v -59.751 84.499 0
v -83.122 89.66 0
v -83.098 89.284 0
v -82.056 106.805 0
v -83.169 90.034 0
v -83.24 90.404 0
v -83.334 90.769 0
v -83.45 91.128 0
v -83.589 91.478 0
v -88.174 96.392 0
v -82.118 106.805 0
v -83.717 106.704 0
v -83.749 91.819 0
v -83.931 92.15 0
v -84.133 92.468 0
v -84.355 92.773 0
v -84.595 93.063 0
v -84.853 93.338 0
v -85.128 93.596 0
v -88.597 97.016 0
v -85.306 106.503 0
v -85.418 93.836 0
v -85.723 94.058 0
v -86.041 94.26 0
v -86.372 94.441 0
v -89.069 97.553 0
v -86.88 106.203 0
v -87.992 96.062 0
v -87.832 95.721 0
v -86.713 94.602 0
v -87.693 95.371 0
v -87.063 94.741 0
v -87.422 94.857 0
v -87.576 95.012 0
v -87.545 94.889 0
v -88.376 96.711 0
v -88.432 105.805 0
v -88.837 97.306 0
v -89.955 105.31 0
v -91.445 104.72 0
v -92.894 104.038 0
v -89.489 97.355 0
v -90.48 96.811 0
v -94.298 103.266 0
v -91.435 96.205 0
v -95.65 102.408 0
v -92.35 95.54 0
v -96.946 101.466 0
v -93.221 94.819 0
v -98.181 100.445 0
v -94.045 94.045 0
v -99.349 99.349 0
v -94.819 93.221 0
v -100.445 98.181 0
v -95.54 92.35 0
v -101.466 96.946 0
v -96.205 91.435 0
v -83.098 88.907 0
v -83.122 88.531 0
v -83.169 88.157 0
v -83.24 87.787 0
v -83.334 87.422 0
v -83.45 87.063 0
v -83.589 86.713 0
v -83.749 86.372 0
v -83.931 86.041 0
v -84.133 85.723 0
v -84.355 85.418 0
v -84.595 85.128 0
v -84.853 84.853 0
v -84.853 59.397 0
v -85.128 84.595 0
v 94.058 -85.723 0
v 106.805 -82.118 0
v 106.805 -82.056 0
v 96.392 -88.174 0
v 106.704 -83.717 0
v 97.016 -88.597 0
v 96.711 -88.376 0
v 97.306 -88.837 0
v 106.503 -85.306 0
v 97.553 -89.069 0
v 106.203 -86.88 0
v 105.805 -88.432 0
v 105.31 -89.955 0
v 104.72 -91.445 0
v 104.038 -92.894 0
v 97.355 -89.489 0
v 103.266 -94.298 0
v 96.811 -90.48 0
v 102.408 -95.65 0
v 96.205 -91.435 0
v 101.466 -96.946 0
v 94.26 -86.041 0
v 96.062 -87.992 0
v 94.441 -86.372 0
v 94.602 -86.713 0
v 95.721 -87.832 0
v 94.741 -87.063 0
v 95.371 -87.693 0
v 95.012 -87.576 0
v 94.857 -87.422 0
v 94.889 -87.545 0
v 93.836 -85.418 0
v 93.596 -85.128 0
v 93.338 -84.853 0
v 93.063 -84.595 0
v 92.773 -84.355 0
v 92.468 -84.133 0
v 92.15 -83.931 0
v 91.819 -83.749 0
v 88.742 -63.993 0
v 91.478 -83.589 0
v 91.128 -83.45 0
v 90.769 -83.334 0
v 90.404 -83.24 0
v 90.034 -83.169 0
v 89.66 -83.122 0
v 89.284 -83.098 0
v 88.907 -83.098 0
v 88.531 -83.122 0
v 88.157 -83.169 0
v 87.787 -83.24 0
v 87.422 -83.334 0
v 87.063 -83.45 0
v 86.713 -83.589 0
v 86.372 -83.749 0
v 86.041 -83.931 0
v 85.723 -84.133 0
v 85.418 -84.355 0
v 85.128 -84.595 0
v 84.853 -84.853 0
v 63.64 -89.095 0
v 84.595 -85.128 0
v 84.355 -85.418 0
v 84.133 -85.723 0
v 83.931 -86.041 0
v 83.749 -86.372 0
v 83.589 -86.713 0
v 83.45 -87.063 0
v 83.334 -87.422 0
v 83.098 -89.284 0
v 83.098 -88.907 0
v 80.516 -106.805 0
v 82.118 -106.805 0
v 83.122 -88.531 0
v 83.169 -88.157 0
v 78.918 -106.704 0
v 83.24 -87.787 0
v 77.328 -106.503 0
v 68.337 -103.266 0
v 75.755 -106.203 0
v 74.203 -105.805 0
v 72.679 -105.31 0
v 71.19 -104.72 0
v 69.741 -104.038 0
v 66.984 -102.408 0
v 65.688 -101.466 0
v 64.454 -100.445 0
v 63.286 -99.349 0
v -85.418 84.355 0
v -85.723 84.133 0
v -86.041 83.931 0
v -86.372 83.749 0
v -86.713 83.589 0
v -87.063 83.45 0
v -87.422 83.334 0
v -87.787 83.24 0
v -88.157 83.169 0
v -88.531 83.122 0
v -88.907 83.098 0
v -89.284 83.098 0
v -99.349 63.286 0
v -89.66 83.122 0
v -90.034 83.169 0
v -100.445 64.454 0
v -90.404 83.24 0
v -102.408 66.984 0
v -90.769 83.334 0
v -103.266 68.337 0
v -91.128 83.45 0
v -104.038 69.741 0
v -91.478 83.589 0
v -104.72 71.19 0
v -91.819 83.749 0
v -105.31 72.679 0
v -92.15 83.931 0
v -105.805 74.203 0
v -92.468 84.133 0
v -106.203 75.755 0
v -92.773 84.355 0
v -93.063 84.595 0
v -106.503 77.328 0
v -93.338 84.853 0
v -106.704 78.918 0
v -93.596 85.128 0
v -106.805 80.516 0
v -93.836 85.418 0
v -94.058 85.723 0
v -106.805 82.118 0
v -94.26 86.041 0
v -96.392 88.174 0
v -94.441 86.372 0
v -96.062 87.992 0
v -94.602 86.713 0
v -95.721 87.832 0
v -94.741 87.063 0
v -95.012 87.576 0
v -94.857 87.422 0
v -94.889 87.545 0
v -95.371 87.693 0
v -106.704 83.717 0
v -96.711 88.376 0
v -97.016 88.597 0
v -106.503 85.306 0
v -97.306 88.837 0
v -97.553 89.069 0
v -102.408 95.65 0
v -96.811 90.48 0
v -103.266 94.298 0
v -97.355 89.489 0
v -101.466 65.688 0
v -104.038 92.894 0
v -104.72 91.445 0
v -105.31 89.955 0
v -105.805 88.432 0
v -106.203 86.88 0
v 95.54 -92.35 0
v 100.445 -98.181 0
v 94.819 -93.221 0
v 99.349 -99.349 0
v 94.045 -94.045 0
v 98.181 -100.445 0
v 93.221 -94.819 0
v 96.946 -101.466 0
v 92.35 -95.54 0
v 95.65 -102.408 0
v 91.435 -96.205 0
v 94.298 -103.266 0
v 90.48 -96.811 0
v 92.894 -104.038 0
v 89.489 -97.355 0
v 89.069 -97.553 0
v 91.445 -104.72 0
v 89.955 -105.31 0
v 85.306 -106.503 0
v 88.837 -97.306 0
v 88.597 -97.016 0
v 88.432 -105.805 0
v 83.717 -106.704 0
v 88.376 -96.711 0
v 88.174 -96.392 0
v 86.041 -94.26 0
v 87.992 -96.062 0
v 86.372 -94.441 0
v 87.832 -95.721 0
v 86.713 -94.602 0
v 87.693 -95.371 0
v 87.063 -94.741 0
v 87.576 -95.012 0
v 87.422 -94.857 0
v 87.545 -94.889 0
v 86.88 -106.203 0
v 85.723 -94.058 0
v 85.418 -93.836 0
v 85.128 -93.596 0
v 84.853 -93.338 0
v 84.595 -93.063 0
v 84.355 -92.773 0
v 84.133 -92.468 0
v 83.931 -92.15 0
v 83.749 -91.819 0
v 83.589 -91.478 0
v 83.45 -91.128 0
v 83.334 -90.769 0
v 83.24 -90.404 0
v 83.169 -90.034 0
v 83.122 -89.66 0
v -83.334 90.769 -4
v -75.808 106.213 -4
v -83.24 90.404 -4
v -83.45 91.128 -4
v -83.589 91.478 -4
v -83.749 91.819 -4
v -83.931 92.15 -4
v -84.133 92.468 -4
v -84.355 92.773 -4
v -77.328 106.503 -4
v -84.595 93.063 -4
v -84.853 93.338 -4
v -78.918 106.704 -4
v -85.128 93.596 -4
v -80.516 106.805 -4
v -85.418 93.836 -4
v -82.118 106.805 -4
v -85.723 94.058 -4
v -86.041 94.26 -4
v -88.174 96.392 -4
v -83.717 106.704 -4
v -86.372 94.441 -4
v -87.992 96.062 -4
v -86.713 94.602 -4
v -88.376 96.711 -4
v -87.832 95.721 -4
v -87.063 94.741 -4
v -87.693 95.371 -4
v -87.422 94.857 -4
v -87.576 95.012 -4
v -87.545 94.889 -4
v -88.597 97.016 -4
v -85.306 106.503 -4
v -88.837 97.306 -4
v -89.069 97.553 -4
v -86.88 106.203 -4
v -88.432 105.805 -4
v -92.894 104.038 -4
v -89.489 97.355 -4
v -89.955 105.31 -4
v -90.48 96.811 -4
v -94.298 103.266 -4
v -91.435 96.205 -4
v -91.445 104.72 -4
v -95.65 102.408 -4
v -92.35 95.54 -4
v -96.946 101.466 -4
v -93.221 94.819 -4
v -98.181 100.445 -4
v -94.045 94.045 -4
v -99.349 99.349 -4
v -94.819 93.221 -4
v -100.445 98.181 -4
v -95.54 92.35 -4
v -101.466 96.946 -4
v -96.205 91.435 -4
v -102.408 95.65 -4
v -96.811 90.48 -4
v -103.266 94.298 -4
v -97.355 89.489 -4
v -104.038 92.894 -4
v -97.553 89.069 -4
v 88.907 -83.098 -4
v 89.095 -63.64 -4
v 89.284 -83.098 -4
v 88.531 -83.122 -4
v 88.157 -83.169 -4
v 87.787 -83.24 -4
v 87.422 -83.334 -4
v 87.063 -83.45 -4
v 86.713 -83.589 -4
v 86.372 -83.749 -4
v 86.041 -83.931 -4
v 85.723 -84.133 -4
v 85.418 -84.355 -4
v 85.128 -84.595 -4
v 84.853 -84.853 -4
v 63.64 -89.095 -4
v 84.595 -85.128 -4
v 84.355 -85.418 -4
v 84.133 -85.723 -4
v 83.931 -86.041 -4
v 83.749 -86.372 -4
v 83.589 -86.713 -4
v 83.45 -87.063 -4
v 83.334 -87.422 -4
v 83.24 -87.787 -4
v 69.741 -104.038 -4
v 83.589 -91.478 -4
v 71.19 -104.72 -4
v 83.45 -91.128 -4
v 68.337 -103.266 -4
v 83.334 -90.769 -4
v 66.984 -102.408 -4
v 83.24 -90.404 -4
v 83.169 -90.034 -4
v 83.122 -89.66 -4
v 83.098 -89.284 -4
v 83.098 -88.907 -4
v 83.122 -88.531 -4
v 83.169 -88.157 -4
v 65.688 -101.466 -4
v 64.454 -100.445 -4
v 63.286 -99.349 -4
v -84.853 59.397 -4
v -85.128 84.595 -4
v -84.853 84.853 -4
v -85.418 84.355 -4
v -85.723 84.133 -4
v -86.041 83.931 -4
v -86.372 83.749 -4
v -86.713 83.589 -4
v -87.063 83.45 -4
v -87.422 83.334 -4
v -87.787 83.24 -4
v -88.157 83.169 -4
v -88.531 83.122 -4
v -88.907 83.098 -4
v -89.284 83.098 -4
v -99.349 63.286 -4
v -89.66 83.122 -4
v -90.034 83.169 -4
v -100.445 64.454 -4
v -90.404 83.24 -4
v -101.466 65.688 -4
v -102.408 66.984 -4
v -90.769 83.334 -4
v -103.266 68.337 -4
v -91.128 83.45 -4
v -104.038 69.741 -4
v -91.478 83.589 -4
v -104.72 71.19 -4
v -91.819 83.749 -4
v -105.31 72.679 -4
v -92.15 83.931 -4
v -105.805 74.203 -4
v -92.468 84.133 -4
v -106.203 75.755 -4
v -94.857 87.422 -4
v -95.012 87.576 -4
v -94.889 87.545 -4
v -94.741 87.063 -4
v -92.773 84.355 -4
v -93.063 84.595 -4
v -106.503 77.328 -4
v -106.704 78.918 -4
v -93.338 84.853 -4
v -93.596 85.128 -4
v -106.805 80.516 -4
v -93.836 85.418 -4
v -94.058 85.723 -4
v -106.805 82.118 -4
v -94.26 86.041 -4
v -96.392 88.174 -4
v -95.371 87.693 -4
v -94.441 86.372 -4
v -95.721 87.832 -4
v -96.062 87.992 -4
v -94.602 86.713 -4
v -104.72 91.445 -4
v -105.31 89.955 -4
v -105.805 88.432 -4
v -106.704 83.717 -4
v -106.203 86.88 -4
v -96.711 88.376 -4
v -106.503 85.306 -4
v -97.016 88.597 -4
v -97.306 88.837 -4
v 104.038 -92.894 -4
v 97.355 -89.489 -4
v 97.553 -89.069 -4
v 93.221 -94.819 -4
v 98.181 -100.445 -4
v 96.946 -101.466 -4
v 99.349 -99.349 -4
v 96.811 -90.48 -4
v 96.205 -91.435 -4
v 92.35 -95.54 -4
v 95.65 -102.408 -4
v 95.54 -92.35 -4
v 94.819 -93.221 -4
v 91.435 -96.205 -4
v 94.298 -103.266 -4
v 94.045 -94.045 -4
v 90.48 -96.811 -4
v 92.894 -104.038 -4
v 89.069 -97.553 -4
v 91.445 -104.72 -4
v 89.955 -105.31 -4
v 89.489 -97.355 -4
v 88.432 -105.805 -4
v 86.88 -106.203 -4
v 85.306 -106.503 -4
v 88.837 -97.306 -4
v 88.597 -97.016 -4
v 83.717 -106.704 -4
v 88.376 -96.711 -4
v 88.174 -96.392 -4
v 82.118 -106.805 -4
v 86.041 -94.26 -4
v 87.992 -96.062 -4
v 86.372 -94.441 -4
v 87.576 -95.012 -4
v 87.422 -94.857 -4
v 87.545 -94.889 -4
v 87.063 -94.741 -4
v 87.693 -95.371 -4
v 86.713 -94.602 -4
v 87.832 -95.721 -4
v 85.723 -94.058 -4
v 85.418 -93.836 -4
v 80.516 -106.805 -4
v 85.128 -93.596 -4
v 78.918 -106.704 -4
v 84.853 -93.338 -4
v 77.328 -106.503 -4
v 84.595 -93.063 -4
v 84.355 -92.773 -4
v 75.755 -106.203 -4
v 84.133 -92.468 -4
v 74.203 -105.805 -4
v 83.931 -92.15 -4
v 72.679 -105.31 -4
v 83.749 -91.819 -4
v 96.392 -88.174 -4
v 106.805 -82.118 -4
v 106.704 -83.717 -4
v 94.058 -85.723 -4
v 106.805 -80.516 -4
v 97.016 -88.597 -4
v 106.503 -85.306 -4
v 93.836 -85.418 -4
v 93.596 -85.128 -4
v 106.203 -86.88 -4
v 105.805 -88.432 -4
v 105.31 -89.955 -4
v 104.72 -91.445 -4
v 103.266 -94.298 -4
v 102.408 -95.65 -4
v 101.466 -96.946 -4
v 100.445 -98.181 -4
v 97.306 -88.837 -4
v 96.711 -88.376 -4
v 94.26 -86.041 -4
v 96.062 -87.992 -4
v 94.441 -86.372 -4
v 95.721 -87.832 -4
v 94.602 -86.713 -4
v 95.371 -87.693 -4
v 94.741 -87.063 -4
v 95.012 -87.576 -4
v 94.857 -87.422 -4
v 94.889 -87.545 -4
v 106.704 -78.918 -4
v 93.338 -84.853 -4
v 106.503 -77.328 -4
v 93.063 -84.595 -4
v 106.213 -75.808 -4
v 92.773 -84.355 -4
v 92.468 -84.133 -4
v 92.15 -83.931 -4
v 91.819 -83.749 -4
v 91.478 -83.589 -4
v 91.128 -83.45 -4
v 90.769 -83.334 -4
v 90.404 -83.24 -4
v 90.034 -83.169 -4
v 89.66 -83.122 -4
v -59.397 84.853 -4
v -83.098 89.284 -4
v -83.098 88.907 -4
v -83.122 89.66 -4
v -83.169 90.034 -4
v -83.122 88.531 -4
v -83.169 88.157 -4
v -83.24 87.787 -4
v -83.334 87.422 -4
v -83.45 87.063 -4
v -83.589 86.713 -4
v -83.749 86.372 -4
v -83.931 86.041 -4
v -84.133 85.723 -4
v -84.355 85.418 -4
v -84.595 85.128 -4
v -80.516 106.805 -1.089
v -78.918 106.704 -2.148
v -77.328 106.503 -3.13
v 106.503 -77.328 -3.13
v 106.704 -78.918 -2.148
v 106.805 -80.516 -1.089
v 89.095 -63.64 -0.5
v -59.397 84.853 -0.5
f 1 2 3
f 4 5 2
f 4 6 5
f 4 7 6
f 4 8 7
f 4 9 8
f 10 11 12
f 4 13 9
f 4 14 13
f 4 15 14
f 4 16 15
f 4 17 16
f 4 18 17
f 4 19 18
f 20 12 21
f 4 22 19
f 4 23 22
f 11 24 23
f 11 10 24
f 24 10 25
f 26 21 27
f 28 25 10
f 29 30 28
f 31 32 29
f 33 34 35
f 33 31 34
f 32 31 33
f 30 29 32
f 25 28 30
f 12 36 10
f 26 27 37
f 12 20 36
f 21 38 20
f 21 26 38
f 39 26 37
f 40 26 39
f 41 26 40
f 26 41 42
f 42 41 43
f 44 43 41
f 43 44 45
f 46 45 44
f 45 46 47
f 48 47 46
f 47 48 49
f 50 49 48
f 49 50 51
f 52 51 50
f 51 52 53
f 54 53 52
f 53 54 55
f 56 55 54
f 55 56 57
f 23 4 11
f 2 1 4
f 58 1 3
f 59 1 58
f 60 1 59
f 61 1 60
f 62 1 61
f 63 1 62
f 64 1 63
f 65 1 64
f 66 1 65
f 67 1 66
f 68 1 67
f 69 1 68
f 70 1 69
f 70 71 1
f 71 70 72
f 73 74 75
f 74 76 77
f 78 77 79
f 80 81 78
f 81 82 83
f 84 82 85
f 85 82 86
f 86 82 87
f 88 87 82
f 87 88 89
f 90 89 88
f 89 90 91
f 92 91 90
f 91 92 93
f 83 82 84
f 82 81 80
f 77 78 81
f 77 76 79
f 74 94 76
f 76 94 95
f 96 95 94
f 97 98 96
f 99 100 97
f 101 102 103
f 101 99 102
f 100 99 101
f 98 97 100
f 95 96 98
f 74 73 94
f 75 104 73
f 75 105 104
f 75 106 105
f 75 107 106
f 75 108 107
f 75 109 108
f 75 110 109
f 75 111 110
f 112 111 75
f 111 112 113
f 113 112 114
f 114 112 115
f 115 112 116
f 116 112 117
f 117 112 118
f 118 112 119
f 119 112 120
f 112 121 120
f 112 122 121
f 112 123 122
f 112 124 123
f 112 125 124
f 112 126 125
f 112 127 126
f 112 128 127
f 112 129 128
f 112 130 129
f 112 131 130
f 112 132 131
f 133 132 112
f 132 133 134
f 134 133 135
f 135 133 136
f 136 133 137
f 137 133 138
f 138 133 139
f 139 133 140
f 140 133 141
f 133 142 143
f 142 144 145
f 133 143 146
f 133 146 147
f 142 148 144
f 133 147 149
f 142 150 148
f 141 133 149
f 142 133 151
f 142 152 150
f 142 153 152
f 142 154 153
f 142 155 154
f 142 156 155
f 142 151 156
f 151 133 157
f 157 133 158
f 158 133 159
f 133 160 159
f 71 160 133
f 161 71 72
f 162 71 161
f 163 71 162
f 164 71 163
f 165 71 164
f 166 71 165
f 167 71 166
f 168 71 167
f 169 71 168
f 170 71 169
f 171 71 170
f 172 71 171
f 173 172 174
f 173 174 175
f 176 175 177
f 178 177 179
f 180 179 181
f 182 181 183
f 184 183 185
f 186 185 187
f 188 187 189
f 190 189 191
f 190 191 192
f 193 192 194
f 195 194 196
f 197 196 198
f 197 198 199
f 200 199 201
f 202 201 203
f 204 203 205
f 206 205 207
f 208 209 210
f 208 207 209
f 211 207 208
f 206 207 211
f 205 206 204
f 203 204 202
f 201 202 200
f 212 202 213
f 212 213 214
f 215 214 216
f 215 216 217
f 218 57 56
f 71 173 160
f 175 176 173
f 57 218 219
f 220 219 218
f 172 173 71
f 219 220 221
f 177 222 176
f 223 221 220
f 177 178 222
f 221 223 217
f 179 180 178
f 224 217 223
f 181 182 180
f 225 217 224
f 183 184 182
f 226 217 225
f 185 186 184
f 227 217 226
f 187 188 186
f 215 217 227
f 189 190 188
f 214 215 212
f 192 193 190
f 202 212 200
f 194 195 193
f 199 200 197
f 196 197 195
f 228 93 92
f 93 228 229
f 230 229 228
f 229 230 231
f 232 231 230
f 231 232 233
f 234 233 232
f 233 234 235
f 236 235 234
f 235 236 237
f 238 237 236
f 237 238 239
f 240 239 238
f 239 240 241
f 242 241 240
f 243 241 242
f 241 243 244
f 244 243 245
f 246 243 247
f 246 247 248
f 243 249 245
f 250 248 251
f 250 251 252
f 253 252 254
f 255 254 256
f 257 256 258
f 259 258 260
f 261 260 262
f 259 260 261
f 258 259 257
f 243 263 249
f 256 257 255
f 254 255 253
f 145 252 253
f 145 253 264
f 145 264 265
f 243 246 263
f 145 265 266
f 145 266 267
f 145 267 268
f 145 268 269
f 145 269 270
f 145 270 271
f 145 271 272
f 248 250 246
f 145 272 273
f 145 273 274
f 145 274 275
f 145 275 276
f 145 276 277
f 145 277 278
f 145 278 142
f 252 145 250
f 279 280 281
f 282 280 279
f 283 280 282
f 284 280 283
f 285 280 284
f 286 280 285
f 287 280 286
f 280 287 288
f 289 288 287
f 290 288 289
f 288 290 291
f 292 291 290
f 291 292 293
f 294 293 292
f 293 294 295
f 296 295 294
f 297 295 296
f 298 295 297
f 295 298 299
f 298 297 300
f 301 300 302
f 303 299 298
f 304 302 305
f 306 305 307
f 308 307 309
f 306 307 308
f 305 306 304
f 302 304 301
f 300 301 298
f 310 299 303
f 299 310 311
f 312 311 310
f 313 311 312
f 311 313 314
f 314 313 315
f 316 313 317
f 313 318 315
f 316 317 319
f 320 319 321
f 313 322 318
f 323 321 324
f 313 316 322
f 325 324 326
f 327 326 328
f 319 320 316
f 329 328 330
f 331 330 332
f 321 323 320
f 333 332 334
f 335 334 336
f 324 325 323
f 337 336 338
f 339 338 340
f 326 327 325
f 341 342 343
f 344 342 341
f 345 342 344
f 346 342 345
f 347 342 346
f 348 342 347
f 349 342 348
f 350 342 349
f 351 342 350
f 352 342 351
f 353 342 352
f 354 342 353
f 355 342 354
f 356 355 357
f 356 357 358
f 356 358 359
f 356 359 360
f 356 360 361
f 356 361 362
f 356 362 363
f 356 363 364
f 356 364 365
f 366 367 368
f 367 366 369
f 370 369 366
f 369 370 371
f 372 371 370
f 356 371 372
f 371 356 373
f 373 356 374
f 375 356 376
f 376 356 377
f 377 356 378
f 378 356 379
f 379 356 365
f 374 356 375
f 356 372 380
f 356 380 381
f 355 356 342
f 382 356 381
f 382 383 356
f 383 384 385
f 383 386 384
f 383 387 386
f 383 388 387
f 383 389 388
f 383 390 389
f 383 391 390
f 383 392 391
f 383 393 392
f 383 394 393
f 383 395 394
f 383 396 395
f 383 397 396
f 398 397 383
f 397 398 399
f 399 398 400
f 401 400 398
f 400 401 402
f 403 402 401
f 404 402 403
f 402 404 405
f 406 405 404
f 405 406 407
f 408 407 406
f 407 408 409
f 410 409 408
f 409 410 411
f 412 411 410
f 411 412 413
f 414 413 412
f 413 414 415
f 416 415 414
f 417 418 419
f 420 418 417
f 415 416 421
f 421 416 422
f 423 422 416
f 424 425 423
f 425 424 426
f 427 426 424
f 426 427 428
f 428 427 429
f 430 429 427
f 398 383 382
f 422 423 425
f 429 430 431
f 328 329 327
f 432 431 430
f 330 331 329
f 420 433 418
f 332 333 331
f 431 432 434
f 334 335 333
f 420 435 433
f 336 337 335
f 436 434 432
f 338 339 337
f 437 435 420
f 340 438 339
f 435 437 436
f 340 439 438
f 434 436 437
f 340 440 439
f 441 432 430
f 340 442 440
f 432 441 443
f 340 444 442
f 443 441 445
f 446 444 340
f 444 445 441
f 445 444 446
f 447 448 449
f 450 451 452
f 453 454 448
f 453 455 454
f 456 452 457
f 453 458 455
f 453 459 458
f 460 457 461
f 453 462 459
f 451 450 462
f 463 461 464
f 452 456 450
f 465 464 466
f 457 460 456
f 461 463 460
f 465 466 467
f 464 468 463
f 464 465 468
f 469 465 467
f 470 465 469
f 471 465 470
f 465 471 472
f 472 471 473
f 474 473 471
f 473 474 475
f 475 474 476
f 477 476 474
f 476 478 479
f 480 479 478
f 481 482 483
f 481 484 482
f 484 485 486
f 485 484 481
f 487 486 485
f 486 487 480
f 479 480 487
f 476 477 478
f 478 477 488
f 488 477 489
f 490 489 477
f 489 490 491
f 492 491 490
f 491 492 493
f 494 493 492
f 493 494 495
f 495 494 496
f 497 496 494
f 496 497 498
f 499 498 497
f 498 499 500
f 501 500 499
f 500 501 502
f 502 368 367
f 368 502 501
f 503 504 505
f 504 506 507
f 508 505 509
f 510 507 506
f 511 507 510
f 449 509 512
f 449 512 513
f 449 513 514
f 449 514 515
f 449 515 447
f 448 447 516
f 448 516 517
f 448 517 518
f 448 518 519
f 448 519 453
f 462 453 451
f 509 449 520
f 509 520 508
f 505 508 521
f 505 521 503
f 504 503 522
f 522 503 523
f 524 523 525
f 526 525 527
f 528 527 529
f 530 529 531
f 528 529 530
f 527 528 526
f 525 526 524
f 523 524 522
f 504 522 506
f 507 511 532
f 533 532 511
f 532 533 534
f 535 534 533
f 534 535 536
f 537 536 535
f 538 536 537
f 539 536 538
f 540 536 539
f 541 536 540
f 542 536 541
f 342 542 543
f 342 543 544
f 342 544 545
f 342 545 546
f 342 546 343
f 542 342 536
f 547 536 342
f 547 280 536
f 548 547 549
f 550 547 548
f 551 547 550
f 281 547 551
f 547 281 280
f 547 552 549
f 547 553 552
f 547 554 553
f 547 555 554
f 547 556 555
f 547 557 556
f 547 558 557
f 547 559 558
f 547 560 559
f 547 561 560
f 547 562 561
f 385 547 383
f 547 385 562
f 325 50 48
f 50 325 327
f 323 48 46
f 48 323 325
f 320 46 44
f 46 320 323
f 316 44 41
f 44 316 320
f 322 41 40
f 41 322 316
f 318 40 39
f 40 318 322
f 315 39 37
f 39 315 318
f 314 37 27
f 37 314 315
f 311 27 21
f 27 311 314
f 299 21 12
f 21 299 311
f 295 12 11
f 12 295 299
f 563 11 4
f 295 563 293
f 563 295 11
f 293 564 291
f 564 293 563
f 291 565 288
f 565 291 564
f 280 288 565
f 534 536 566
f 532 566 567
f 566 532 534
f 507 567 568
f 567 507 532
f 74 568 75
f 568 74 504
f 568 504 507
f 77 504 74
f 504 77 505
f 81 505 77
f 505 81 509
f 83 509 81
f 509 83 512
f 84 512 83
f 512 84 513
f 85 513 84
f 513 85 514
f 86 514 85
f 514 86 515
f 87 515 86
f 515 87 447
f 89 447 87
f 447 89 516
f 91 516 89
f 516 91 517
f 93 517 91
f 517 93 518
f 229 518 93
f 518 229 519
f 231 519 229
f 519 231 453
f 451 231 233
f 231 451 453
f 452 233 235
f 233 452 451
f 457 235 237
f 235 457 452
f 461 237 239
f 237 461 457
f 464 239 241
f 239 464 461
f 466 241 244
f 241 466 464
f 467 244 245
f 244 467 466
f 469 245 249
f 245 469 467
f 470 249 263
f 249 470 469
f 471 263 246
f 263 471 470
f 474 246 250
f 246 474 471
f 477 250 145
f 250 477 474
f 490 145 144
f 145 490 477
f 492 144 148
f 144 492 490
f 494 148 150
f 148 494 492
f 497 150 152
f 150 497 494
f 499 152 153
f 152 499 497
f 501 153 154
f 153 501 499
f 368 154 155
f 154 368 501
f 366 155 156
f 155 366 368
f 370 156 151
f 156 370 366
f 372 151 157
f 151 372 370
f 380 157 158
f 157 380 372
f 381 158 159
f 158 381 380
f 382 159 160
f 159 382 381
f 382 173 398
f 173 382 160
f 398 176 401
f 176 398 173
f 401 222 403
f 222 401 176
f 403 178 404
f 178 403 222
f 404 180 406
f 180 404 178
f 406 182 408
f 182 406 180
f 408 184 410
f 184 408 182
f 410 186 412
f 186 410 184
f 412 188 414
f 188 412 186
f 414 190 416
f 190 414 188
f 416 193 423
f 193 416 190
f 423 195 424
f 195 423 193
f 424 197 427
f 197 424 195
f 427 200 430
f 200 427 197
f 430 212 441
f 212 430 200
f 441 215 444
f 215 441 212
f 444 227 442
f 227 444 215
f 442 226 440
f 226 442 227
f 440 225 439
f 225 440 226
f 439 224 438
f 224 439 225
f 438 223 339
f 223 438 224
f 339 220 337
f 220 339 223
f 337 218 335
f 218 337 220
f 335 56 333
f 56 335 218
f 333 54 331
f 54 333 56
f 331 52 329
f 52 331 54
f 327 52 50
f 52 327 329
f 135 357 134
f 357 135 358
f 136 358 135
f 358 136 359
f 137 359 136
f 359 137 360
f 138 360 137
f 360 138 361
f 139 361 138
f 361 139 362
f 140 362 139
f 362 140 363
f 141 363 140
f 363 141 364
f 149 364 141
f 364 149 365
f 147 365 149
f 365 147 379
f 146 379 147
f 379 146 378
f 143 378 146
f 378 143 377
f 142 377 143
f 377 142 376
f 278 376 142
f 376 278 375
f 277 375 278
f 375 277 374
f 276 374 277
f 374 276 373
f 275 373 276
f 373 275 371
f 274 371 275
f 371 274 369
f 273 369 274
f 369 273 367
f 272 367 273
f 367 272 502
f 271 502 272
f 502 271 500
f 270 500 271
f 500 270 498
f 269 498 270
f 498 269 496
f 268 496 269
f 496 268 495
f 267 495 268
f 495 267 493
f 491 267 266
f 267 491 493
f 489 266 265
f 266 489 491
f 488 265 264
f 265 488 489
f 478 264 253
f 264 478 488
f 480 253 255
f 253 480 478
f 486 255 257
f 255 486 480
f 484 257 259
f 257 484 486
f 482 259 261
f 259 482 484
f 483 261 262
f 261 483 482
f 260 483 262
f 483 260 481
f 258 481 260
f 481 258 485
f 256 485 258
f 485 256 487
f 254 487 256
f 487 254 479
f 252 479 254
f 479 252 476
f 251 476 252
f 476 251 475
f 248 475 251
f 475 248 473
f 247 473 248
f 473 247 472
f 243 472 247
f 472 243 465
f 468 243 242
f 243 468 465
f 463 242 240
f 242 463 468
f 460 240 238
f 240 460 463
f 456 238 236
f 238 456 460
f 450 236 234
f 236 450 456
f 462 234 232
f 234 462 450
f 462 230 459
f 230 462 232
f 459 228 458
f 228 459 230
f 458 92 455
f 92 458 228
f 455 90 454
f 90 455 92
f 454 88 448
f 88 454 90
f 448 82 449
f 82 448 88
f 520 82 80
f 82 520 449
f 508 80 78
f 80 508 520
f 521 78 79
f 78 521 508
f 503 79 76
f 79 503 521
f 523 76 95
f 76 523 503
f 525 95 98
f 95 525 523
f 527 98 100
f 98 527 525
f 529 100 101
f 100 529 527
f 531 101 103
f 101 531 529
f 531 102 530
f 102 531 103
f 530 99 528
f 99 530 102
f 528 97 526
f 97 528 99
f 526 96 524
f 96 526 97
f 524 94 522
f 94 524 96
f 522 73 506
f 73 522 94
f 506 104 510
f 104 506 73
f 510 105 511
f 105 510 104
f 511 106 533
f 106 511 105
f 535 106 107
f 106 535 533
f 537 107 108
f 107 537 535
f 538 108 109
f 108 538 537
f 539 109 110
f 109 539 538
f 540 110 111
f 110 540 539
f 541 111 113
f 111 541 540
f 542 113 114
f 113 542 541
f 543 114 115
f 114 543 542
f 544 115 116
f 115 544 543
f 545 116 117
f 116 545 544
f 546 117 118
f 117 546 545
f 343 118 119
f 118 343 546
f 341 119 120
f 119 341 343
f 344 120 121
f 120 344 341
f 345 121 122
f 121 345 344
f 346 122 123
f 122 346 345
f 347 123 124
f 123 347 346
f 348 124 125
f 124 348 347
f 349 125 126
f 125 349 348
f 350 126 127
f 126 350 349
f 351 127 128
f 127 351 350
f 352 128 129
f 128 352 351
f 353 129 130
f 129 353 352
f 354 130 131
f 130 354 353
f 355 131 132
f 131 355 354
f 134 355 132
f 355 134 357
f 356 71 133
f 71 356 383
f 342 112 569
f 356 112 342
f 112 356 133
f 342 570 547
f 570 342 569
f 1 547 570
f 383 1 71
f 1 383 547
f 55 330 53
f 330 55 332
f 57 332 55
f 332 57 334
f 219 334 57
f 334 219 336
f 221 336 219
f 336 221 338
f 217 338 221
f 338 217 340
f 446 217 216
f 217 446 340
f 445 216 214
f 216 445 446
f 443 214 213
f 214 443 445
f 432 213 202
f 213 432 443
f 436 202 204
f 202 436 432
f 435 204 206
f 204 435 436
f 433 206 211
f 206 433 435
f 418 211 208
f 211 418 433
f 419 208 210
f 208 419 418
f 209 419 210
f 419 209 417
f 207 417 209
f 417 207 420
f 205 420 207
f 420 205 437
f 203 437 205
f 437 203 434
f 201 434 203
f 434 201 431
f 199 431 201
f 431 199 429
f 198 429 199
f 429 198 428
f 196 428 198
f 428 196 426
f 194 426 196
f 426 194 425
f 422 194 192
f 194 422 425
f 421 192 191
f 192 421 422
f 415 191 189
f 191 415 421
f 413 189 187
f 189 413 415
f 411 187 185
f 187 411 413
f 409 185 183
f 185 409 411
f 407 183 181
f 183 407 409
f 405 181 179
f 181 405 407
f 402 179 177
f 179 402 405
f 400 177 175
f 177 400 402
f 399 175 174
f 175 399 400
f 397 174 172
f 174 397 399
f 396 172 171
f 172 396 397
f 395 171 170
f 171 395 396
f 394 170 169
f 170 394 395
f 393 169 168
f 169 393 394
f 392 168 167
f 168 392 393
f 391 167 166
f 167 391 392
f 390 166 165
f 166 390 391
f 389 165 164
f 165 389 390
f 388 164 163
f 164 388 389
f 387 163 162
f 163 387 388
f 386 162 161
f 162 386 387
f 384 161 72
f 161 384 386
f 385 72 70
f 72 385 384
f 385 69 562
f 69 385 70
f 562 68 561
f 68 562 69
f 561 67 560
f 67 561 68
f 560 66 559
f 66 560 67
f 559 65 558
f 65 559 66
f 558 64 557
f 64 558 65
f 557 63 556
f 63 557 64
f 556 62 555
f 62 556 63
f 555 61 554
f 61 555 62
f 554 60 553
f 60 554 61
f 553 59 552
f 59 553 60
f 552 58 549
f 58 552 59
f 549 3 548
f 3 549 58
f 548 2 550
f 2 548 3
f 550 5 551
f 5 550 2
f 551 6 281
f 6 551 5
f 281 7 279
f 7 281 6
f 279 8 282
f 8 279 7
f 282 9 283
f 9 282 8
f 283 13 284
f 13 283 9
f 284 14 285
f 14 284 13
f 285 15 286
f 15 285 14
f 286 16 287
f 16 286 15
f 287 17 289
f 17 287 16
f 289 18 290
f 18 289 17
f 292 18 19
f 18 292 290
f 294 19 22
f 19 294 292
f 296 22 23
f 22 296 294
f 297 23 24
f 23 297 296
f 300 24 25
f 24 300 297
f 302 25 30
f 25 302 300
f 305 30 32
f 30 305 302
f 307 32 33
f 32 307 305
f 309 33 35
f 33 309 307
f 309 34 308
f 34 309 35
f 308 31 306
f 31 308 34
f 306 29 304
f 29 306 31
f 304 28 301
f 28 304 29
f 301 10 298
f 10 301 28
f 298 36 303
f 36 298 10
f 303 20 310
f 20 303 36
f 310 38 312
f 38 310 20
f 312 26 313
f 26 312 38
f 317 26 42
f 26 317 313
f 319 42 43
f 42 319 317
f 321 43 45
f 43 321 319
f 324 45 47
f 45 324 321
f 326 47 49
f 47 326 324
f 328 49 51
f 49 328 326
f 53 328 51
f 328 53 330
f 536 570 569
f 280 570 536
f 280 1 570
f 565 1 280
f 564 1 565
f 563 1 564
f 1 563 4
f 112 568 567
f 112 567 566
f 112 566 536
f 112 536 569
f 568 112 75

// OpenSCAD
ts=7.5;//толщина стенки
plx=51; //размер замка по x
ply=281; //размер замка по y
plz=4;//высота прокладки
$fn=100;
top=106;
bot=146;
db=36;
cs=ply-plx;//растояние между центрами скругления
lst=top+bot;//растояние междцу стойками крепления
//dtop=16;
dbot=12;
ln=8;
//all ();
//part();
rotate([180,0,45])difference(){
part_top();
translate([plx/2-ln,0,0])rotate([0,45,0])translate([5,0,2*plz])cube([10,ply,4*plz],true);
    //cube([10,ply,4*plz],true);
}
module part_top(){
        linear_extrude(plz, true)all ();
}

module part(){
    difference(){
        all ();
        translate([(plx-ln)/2,0,0])square([ ln,ply],true);
    }
    
}

module all (){
    intersection(){
        union(){
            difference(){
                translate([0,(lst-1*dbot)/2,0])square([ plx-ts,2*dbot],true);  
                translate([0,lst/2,0])circle(d=dbot);
                translate([0,dbot/2+lst/2,0])circle(d=dbot);
            }
            difference(){
                translate([0,-(lst-1*dbot)/2,0])square([ plx-ts,3*dbot],true);  
                translate([0,-lst/2,0])circle(d=dbot);
                translate([0,-(dbot/2+lst/2),0])circle(d=dbot);
            }
        }
        union(){
            translate([0,cs/2,0])circle(d=plx);
            translate([0,-cs/2,0])circle(d=plx);
            square([plx, cs],true);
        }
    }
    difference(){
        union(){
            translate([0,cs/2,0])circle(d=plx);
            translate([0,-cs/2,0])circle(d=plx);
            square([plx, cs],true);
        }
        union(){
            translate([0,cs/2,0])circle(d=plx-2*ts);
            translate([0,-cs/2,0])circle(d=plx-2*ts);
            square([plx-2*ts, cs],true);
        } 
        translate([0,lst/2-top,0])circle(d=db);
    }
}
